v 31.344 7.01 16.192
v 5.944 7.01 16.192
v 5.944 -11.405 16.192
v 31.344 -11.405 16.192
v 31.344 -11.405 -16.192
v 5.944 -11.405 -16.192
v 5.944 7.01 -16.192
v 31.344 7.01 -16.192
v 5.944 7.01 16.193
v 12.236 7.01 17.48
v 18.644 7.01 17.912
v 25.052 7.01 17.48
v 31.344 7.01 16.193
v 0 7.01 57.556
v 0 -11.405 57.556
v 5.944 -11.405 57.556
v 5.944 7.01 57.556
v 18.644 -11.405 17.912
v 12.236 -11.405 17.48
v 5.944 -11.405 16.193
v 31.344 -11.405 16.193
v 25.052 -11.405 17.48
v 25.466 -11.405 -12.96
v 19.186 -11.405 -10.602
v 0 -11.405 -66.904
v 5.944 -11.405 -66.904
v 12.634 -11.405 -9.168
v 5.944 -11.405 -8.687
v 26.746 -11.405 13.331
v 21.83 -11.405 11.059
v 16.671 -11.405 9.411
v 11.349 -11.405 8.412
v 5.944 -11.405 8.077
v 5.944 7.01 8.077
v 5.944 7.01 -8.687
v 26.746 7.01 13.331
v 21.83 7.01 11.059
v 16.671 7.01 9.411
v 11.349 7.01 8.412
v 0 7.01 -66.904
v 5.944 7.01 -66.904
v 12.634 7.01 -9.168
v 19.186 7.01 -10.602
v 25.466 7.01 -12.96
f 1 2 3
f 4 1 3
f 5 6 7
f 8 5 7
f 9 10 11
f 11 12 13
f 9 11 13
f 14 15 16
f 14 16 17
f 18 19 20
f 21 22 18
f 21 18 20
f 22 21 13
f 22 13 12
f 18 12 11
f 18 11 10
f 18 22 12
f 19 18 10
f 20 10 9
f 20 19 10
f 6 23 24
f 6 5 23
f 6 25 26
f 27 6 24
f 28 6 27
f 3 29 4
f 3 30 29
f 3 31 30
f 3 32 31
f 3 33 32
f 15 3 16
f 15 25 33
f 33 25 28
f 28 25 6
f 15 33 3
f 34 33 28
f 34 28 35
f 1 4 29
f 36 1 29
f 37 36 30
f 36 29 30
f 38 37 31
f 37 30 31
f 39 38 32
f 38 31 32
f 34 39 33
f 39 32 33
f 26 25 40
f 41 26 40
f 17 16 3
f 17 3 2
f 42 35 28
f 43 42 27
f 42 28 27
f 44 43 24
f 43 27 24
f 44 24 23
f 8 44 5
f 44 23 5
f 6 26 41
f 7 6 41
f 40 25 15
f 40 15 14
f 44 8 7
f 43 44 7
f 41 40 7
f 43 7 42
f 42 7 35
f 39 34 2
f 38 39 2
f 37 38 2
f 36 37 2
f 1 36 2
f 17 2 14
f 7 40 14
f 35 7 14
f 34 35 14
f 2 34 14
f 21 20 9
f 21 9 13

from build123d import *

# Parameters (mm, degrees)
F0_W     = 18.415
F0_H     = 124.46
F1_DEPTH = 5.9436
F3_DEPTH = 25.4
F4_DEPTH = 25.4
F6_DEPTH = 50.8
F7_DEPTH = 18.415


with BuildPart() as f1:
    # F0 (on Right) → F1 (new body)
    with BuildSketch(Plane.YZ):
        with Locations((-2.197098, -4.673599)):
            Rectangle(F0_W, F0_H)
    extrude(amount=F1_DEPTH)

    # F2 (on face) → F3 (join)
    with BuildSketch(Plane.YZ.offset(5.9436)):
        Polygon((-11.404598, -16.1925), (0, -16.1925), (7.010402, -16.1925), (7.010402, -8.6868), (-11.404598, -8.6868), align=None)
        Polygon((7.010402, 16.1925), (0, 16.1925), (-11.404598, 16.1925), (-11.404598, 8.0772), (7.010402, 8.0772), align=None)
    extrude(amount=F3_DEPTH)

    # F2 (on face) → F4 (join)
    with BuildSketch(Plane.YZ.offset(5.9436)):
        Polygon((-11.404598, -16.1925), (0, -16.1925), (7.010402, -16.1925), (7.010402, -8.6868), (-11.404598, -8.6868), align=None)
    extrude(amount=F4_DEPTH)

    # F5 (on face) → F6 (cut)
    with BuildSketch(Plane.XZ.offset(11.404598)):
        with BuildLine():
            Line((31.3436, -16.1925), (5.9436, -16.1925))
            ThreePointArc((5.9436, -16.1925), (18.6436, -17.912299), (31.3436, -16.1925))
        make_face()
        with BuildLine():
            Line((5.9436, 16.1925), (31.3436, 16.1925))
            ThreePointArc((31.3436, 16.1925), (18.6436, 17.912299), (5.9436, 16.1925))
        make_face()
        with BuildLine():
            Line((31.3436, -8.6868), (5.9436, -8.6868))
            ThreePointArc((5.9436, -8.6868), (19.186481, -10.602491), (31.3436, -16.1925))
            Line((31.3436, -16.1925), (31.3436, -8.6868))
        make_face()
        with BuildLine():
            ThreePointArc((31.3436, 16.1925), (19.276061, 10.155315), (5.9436, 8.0772))
            Line((5.9436, 8.0772), (31.3436, 8.0772))
            Line((31.3436, 8.0772), (31.3436, 16.1925))
        make_face()
    extrude(amount=-F6_DEPTH, mode=Mode.SUBTRACT)


with BuildPart() as f7:
    # F5 (on face) → F7 (new body)
    with BuildSketch(Plane.XZ.offset(11.404598)):
        with BuildLine():
            Line((5.9436, 16.1925), (31.3436, 16.1925))
            ThreePointArc((31.3436, 16.1925), (18.6436, 17.912299), (5.9436, 16.1925))
        make_face()
    extrude(amount=-F7_DEPTH)


solid = Compound([f1.part, f7.part])
